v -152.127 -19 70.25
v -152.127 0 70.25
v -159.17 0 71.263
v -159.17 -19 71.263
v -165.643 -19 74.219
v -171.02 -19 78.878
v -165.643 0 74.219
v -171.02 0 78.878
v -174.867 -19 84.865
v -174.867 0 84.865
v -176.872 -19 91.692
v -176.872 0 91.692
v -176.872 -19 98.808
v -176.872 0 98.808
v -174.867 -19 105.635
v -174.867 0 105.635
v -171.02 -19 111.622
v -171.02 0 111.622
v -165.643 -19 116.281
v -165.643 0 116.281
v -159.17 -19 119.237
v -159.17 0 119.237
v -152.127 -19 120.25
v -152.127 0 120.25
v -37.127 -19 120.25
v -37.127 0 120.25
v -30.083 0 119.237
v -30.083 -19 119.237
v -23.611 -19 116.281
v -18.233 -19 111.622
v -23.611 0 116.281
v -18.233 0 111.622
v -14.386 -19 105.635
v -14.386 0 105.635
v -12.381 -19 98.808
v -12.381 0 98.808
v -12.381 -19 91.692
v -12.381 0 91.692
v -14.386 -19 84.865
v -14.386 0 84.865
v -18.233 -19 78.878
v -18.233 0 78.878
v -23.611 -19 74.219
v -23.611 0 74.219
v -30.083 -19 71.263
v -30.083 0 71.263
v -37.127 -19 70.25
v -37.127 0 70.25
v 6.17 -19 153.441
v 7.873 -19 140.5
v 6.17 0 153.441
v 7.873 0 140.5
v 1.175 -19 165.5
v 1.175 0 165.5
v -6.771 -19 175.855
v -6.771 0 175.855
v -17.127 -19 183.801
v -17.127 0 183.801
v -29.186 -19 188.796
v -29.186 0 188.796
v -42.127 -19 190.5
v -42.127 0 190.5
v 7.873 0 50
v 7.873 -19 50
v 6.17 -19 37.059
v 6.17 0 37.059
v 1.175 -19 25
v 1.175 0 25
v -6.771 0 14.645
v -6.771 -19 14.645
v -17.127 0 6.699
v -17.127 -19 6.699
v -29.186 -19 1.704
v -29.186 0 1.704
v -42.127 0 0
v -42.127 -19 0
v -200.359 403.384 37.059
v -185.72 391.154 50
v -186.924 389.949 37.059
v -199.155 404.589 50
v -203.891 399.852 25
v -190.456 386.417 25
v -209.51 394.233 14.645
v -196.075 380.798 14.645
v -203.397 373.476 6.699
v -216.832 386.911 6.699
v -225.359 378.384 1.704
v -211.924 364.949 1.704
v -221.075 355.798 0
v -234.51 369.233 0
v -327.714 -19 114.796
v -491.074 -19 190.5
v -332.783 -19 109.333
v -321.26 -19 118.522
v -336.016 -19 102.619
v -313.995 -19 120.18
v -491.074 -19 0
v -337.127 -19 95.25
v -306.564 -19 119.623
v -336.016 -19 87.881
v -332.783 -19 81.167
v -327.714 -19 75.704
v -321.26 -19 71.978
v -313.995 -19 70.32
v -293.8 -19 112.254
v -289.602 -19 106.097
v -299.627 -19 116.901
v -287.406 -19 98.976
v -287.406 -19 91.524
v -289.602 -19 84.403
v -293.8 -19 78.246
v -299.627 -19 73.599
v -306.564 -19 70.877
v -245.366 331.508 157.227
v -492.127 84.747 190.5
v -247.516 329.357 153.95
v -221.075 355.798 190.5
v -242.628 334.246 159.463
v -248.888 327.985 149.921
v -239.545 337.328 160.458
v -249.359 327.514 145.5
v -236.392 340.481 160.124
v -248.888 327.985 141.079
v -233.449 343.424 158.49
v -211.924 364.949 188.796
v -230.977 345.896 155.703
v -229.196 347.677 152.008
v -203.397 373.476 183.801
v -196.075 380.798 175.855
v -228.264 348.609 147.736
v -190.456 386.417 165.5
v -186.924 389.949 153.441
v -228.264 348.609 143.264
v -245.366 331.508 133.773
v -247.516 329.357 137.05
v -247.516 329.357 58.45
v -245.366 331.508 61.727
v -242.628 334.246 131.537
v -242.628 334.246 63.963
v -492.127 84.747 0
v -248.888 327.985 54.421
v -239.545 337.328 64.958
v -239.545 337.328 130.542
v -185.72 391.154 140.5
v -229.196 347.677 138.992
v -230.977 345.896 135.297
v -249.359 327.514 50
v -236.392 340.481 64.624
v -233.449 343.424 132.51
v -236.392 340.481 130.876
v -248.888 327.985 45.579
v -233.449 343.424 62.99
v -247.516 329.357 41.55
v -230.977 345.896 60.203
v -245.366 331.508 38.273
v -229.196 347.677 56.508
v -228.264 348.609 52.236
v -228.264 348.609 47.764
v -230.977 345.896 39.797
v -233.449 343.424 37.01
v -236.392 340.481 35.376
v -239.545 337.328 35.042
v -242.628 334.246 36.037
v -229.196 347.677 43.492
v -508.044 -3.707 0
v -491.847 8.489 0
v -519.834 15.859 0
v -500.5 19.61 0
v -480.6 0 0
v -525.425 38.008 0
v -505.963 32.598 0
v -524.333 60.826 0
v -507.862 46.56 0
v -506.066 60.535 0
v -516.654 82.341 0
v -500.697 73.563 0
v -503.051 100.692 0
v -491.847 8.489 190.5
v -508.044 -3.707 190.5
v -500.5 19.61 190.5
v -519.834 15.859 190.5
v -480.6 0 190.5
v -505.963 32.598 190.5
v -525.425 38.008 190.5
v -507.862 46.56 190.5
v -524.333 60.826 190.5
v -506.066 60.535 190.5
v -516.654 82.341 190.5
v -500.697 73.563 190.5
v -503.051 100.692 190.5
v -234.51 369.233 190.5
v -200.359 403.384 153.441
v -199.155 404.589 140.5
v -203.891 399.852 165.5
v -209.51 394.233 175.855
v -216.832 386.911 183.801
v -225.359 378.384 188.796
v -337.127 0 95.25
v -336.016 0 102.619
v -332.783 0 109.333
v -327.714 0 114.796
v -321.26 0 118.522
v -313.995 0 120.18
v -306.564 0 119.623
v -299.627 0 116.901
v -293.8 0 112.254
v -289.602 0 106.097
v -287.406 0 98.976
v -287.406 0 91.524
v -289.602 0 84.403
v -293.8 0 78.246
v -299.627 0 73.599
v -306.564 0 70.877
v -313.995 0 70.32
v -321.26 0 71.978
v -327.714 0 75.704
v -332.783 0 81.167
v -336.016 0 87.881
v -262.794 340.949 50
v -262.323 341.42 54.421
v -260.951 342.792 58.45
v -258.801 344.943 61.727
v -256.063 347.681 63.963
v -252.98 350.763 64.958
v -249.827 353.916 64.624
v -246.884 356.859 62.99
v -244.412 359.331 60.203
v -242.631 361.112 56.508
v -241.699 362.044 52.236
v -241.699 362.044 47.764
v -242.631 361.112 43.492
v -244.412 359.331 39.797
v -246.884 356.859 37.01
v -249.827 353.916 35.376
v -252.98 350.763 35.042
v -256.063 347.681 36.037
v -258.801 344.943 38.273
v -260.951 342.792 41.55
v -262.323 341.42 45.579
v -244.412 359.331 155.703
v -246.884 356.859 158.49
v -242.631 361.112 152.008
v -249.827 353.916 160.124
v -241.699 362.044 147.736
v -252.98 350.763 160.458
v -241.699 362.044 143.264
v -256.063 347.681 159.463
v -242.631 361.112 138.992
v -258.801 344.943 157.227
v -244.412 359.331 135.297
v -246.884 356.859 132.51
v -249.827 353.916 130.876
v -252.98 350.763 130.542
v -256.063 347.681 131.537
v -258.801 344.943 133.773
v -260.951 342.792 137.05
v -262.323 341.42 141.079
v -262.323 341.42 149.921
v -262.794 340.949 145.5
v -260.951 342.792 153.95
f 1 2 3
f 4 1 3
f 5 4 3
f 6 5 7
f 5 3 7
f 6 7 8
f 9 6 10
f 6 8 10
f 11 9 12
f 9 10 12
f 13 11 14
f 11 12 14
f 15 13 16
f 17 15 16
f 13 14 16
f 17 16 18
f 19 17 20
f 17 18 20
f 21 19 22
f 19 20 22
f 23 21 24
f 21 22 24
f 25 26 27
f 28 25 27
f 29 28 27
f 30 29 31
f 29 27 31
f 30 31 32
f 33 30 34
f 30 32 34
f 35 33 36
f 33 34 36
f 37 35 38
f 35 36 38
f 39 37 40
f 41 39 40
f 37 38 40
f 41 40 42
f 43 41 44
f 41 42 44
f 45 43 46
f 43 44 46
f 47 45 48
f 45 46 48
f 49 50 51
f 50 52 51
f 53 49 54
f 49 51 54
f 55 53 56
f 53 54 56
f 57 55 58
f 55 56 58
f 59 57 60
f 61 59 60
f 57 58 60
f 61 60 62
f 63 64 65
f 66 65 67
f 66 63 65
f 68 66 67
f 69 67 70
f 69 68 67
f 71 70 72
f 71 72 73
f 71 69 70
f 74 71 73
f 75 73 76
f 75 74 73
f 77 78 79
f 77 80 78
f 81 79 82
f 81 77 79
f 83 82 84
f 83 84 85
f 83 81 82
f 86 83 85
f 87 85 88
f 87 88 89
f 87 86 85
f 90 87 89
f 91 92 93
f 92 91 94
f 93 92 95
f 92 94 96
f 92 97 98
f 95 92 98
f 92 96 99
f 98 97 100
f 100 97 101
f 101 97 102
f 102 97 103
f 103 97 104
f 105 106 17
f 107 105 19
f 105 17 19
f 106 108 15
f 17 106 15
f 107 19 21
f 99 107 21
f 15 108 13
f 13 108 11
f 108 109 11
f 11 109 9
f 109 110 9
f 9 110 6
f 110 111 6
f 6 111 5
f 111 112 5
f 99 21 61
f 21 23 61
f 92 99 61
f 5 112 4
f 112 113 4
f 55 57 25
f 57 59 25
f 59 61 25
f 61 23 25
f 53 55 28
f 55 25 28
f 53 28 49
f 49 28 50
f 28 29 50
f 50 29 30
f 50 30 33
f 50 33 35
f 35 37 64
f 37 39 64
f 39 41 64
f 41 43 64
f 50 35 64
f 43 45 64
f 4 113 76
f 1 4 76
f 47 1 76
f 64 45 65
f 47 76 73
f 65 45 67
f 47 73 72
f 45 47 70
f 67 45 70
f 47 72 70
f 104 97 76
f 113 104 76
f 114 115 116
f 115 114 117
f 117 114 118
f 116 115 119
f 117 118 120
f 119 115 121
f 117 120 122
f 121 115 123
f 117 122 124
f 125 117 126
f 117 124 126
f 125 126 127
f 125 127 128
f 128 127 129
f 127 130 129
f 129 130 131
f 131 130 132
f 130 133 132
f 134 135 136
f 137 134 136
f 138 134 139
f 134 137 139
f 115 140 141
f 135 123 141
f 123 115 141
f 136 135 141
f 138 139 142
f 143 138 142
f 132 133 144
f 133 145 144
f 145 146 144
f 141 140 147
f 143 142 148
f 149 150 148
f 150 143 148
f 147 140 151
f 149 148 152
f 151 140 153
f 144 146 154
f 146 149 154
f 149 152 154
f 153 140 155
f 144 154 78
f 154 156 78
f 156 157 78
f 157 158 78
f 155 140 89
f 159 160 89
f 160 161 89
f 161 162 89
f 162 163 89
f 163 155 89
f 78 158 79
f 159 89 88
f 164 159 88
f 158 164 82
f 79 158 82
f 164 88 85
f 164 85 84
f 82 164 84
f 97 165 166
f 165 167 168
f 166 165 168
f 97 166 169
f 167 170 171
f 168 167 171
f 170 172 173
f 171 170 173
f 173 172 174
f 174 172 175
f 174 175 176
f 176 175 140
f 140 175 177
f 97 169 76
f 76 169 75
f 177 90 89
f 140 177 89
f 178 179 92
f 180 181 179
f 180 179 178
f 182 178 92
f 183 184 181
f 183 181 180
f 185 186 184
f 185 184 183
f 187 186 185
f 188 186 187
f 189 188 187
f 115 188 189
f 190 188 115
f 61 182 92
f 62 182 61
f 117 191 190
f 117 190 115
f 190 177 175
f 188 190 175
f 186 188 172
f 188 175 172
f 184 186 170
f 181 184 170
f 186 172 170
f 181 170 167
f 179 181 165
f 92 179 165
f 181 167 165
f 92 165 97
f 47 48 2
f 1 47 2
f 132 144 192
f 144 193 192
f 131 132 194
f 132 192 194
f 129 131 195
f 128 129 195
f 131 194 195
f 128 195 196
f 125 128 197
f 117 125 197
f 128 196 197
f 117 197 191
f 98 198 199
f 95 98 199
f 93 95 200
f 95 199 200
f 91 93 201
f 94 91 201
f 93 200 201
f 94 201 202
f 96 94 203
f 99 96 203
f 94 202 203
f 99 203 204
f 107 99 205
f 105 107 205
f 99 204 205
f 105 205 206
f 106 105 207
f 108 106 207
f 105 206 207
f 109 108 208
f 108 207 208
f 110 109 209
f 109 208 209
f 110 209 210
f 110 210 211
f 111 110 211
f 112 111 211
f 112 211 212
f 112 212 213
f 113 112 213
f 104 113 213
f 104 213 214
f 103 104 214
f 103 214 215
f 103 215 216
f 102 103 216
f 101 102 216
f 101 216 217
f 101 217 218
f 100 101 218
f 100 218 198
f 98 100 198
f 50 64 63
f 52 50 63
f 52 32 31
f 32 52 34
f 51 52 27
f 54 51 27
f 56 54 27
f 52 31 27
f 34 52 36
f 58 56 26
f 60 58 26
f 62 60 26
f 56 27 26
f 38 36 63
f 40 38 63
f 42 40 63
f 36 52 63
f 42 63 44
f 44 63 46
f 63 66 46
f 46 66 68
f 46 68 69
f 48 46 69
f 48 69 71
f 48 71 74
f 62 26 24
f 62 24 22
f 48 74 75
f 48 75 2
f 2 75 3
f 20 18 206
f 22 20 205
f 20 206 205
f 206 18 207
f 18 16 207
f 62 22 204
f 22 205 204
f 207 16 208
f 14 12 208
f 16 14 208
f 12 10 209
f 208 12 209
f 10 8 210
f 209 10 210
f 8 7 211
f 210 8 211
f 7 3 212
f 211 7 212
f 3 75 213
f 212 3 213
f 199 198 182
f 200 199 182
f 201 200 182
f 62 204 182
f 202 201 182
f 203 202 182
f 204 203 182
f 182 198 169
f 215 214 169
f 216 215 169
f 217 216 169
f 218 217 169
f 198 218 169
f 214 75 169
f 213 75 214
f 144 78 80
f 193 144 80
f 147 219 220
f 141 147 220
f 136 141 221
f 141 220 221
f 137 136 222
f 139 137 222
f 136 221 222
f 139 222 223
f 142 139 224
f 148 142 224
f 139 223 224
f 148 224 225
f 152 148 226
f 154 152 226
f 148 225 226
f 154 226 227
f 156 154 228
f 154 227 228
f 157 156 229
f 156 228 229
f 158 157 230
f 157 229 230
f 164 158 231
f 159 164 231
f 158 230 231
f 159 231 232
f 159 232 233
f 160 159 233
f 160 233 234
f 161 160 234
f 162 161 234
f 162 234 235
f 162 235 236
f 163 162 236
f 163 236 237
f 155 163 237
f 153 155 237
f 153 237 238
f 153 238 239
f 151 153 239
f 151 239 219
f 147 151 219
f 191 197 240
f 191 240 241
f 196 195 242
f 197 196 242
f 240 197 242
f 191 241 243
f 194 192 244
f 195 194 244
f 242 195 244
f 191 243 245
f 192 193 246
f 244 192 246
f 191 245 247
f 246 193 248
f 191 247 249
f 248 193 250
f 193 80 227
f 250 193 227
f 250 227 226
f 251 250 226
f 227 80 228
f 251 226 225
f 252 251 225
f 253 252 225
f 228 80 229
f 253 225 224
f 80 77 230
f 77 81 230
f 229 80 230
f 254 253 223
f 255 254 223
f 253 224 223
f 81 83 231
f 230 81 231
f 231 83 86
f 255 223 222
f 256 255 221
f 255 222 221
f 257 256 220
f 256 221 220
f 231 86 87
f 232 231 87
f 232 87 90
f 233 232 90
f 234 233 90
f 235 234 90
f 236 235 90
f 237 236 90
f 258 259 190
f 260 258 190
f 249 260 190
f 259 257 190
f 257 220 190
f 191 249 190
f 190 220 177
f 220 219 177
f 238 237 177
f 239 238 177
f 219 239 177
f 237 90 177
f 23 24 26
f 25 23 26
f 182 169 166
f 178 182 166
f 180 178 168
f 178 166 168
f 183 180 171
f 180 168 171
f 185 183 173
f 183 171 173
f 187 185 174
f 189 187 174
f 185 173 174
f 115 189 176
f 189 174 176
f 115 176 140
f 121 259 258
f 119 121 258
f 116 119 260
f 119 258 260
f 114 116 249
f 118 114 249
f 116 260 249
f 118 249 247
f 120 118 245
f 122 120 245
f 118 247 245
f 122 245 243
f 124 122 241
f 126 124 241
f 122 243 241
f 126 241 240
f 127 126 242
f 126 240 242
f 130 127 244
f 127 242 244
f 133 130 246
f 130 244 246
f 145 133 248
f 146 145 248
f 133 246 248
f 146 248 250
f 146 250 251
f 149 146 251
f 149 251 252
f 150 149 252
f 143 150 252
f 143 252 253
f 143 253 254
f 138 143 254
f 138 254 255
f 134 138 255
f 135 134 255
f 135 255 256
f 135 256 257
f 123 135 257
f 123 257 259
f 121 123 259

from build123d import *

# Parameters (mm, degrees)
F1_DEPTH = 190.5
F2_R     = 50
F3_R     = 15
F4_DEPTH = 101.6
F5_R     = 25
F6_DEPTH = 101.6


with BuildPart() as f1:
    # F0 (on Top) → F1 (new body)
    with BuildSketch(Plane.XY):
        with BuildLine():
            Line((7.8734308481, 0), (-480.600476265, 0))
            ThreePointArc((-480.600476265, 0), (-507.3725322107, 39.5160081985), (-492.1265691519, 84.7467333078))
            Line((-492.1265691519, 84.7467333078), (-185.7195747427, 391.1537277171))
            Line((-185.7195747427, 391.1537277171), (-199.1546035852, 404.5887565596))
            Line((-199.1546035852, 404.5887565596), (-503.0509646748, 100.69239547))
            ThreePointArc((-503.0509646748, 100.69239547), (-525.4247574788, 38.0082411155), (-491.0743534565, -19))
            Line((-491.0743534565, -19), (7.8734308481, -19))
            Line((7.8734308481, -19), (7.8734308481, 0))
        make_face()
    extrude(amount=F1_DEPTH)

    # F2
    f2_edges = [f1.edges().sort_by_distance(p)[0] for p in [
        (-192.437089, 397.871242, 190.5),
        (-192.437089, 397.871242, 0),
        (7.873431, -9.5, 190.5),
        (7.873431, -9.5, 0),
    ]]
    fillet(f2_edges, radius=F2_R)

    # F3 (on face) → F4 (cut)
    with BuildSketch(Plane(origin=(-301.8716800724, 301.8716800724, 0), x_dir=(-0.7071067812, -0.7071067812, 0), z_dir=(-0.7071067812, 0.7071067812, 0))):
        with Locations((-70.2638826555, 145.5)):
            Circle(F3_R)
        with Locations((-70.2638826555, 50)):
            Circle(F3_R)
    extrude(amount=-F4_DEPTH, mode=Mode.SUBTRACT)

    # F5 (on face) → F6 (cut)
    with BuildSketch(Plane(origin=(0, 0, 0), x_dir=(-1, 0, 0), z_dir=(0, 1, 0))):
        with Locations((312.1265691519, 95.25)):
            Circle(F5_R)
        with BuildLine():
            Line((152.1265691519, 120.25), (37.1265691519, 120.25))
            ThreePointArc((37.1265691519, 120.25), (12.1265691519, 95.25), (37.1265691519, 70.25))
            Line((37.1265691519, 70.25), (152.1265691519, 70.25))
            ThreePointArc((152.1265691519, 70.25), (177.1265691519, 95.25), (152.1265691519, 120.25))
        make_face()
    extrude(amount=-F6_DEPTH, mode=Mode.SUBTRACT)


solid = f1.part
